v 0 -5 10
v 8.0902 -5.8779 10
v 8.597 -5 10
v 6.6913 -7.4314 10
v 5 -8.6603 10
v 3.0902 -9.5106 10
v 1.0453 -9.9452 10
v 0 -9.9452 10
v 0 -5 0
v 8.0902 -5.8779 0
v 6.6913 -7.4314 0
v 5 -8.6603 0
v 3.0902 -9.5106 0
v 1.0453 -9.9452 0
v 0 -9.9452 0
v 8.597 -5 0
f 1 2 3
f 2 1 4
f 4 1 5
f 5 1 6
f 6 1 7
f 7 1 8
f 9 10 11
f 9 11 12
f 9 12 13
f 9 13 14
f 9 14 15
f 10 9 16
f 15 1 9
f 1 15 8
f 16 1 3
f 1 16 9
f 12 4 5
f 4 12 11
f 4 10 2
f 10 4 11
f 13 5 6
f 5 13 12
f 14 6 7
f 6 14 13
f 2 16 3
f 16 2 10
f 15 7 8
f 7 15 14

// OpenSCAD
// Generated by generate_scads.py
intersection() {
  translate([0,-10,0]) {
    cube(size=[15,5,10], center=false);
  }
  cylinder(h=20, r=10, center=false);
}
